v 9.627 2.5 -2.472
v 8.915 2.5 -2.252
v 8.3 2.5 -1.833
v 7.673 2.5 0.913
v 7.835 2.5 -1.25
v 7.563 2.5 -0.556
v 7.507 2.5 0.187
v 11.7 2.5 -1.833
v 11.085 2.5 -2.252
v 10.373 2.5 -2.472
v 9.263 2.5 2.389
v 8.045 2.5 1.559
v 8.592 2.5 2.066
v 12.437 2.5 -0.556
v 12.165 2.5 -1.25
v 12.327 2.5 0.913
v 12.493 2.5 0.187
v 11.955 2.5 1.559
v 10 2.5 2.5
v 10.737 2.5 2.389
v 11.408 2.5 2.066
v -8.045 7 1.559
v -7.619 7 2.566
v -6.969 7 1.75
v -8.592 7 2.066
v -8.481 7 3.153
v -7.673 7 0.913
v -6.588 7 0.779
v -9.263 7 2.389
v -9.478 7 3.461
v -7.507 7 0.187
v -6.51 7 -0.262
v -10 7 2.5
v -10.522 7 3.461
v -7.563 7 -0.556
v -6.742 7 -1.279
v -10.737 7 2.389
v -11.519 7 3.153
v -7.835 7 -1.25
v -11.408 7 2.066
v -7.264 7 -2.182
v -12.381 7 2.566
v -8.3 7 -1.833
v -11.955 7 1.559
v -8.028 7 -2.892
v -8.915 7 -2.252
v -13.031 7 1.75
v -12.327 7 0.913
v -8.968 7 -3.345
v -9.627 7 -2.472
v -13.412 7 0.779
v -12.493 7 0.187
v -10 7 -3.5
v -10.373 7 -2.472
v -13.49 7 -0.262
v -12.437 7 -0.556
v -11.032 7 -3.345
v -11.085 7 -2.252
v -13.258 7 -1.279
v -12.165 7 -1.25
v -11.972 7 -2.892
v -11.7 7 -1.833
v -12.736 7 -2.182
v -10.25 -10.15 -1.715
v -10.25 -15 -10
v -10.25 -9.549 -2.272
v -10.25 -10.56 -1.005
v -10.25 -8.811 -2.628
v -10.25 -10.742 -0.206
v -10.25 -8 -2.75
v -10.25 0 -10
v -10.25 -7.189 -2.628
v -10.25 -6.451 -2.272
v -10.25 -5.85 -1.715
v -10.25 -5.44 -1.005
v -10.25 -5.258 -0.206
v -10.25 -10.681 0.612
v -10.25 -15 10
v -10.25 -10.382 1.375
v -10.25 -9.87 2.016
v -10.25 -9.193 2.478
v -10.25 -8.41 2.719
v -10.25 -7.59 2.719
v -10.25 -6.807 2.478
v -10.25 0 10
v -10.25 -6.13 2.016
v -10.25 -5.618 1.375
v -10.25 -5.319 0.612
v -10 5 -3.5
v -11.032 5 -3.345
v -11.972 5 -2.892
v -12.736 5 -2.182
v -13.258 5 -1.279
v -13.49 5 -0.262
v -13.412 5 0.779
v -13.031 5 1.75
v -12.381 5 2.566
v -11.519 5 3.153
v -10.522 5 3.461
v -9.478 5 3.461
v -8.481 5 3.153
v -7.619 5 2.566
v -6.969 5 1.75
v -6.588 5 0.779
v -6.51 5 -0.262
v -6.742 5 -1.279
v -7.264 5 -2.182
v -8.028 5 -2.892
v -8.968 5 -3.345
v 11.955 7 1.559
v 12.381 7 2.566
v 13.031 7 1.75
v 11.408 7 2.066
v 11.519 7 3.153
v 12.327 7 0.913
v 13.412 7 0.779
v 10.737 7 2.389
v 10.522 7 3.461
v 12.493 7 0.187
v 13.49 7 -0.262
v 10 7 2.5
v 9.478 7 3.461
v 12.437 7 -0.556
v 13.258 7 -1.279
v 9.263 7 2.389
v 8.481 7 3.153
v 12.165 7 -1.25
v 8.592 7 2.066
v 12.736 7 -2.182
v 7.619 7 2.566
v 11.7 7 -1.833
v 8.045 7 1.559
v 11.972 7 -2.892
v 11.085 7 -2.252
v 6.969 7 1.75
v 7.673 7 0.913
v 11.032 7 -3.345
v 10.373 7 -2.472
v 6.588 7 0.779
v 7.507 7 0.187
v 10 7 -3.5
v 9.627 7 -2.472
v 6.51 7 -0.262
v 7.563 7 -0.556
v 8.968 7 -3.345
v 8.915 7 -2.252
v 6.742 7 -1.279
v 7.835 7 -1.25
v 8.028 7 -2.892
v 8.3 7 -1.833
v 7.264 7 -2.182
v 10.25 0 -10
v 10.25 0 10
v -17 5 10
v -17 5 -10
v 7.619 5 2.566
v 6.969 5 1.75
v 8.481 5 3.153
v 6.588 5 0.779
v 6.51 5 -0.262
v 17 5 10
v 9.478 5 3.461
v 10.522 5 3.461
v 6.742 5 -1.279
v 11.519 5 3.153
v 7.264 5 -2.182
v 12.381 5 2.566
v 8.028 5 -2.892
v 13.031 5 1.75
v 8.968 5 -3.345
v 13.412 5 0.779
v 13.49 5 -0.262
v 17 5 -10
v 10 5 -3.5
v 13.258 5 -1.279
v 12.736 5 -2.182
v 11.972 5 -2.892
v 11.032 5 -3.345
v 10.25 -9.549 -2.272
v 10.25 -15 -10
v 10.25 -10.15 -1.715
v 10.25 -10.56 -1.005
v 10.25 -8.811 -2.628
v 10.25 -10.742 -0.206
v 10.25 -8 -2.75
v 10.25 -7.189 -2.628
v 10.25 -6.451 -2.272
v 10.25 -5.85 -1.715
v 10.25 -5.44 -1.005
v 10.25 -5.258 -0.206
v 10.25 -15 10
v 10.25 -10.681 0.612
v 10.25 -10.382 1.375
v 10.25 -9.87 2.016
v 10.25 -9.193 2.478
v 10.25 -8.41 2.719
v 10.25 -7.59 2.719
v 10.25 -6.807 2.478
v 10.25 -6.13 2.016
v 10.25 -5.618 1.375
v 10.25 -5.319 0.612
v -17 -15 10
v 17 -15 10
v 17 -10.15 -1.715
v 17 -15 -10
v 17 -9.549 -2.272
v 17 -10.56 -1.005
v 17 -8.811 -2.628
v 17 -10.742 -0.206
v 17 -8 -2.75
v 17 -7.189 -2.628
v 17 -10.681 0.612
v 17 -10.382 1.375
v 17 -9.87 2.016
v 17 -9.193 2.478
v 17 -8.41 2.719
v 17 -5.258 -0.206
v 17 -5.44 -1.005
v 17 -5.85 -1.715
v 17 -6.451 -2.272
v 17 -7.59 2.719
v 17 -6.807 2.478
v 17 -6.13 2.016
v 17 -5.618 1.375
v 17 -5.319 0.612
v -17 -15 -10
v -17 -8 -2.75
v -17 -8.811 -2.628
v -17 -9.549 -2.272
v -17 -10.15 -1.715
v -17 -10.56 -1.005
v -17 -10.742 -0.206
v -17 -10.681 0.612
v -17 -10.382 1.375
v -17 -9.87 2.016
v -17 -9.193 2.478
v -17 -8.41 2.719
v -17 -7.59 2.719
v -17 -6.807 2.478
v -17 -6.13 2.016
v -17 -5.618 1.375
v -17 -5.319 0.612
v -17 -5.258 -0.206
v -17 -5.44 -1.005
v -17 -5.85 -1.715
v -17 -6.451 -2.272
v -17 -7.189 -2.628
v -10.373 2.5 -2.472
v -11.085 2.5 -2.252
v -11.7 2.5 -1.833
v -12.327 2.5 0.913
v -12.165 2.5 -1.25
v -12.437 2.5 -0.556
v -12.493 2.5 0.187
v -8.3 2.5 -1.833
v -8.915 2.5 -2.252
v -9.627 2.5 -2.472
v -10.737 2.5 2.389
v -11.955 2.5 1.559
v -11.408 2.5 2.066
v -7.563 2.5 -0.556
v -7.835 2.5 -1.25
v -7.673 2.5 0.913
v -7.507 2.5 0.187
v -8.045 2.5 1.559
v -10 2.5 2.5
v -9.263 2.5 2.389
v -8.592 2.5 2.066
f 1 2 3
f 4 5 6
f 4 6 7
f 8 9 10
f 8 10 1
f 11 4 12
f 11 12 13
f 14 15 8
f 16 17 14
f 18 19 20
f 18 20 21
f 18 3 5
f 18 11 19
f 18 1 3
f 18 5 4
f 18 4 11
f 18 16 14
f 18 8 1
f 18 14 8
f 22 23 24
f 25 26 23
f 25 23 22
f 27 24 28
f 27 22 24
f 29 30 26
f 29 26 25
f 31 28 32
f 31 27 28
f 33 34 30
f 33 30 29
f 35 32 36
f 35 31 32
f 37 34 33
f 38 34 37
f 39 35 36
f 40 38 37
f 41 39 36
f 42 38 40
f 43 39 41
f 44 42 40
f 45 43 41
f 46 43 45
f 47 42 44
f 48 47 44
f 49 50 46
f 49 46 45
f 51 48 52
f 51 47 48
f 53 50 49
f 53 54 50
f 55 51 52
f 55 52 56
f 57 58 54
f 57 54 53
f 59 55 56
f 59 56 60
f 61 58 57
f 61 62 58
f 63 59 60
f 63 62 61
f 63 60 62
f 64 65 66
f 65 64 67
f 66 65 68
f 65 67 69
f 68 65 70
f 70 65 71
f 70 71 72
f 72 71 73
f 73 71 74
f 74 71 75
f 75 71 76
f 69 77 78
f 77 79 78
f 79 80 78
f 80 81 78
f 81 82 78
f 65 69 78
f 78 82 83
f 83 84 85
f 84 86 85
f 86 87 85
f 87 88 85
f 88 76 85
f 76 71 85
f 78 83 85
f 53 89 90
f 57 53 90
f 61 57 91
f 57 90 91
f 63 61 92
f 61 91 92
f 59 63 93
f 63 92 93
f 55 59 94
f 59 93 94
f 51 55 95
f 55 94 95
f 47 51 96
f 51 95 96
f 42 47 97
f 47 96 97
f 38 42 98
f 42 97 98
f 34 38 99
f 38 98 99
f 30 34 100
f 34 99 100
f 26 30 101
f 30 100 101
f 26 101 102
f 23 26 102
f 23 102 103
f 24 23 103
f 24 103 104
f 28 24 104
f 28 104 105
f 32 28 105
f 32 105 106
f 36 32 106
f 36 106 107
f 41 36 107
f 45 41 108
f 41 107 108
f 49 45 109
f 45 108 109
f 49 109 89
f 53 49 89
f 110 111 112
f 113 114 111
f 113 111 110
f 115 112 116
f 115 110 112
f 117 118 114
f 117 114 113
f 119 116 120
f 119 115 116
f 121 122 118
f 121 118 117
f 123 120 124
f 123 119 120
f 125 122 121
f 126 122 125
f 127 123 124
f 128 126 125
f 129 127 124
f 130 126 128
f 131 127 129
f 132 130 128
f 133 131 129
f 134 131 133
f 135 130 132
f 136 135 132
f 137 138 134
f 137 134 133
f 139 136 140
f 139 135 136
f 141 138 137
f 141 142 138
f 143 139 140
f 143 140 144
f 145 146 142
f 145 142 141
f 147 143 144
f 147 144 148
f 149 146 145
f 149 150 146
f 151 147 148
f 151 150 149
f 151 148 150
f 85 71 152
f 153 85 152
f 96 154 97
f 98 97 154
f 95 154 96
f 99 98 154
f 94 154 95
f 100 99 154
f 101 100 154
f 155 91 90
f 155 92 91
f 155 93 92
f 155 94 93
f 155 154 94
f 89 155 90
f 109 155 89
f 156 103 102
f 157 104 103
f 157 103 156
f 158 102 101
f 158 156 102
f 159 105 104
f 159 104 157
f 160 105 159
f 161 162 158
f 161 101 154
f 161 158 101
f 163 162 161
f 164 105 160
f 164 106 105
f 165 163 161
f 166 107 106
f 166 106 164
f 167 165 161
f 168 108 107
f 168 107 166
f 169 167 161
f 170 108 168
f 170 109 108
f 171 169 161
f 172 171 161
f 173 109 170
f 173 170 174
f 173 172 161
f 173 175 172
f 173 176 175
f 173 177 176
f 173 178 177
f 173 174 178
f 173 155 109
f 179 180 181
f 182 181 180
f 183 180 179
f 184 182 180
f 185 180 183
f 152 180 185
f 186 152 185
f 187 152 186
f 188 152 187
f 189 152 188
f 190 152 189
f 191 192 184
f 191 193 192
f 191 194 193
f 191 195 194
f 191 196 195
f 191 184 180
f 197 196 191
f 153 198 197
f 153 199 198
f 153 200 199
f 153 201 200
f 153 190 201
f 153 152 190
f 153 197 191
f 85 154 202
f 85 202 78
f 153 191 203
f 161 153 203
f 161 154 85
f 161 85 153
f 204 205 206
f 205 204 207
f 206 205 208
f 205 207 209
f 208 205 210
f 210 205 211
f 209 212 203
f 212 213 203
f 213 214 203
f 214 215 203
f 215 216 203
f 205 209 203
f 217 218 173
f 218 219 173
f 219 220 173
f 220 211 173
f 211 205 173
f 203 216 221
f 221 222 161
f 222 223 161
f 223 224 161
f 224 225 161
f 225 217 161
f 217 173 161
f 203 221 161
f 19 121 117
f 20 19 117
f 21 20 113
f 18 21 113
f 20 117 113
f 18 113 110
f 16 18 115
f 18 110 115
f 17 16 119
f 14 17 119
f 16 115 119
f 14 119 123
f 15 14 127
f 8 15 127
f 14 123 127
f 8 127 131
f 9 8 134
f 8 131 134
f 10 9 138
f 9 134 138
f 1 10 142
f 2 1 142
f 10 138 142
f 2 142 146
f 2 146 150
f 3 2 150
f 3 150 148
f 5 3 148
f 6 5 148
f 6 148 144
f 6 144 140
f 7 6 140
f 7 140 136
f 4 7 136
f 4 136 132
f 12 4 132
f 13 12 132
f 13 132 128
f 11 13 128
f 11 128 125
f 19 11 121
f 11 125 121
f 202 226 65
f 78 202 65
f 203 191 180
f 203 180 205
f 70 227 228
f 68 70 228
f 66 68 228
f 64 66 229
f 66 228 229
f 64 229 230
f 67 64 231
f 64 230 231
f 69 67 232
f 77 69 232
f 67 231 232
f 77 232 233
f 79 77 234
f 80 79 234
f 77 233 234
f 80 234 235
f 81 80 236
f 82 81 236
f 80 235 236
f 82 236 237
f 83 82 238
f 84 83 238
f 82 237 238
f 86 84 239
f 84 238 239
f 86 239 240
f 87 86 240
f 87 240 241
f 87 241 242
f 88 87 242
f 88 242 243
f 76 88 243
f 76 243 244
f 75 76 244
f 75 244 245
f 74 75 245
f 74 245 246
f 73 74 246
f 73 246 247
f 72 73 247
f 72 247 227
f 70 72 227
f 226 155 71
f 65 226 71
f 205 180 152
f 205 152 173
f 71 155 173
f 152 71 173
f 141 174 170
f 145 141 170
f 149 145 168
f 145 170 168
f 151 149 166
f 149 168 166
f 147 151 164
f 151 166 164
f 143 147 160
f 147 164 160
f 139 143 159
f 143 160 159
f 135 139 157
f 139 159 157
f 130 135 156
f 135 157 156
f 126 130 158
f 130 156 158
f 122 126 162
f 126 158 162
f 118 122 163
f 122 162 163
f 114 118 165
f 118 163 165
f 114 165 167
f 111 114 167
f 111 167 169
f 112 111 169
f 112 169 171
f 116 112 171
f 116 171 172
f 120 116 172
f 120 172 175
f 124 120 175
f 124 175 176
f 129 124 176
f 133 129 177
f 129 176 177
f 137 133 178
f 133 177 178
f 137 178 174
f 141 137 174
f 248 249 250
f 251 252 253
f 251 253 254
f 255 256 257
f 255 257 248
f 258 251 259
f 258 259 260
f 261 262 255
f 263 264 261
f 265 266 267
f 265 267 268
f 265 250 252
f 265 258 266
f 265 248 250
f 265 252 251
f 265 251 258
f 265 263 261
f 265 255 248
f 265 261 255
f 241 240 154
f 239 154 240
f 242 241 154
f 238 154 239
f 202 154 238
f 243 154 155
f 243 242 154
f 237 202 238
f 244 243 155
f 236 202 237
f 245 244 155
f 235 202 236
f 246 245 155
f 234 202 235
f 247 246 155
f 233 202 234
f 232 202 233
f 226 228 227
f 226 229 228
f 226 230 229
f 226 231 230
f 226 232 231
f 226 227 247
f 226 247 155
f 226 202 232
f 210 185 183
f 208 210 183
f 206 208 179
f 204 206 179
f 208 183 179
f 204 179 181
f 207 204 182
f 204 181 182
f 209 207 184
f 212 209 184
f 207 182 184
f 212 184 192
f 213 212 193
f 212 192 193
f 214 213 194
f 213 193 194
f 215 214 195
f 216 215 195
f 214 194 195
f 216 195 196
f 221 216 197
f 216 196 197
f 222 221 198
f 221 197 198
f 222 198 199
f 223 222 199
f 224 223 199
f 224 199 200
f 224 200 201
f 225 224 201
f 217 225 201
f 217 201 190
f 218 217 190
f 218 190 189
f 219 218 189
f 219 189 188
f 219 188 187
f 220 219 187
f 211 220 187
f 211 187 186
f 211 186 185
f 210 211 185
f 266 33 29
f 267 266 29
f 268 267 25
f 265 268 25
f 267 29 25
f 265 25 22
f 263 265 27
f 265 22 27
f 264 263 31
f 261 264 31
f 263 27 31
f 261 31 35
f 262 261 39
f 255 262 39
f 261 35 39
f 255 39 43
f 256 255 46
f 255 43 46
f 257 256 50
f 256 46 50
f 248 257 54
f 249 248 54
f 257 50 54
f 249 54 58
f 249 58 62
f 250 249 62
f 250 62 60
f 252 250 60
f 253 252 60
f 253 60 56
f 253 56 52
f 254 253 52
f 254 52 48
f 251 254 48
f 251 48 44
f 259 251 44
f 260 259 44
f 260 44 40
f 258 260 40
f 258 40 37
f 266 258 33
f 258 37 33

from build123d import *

# Parameters (mm, degrees)
SKETCH1_W            = 34
SKETCH1_H            = 20
BOSS_EXTRUDE1_DEPTH  = 5
SKETCH2_R            = 3.5
BOSS_EXTRUDE2_DEPTH  = 2
SKETCH3_R            = 2.5
CUT_EXTRUDE1_DEPTH   = 4.5
SKETCH4_W            = 6.75
SKETCH4_H            = 20
BOSS_EXTRUDE3_DEPTH  = 15
M5_CLEARANCE_HOLE1_D = 5.5


with BuildPart() as part:
    # Sketch1 → Boss-Extrude1 (new body)
    with BuildSketch(Plane(origin=(0, 0, 0), x_dir=(1, 0, 0), z_dir=(0, 1, 0))):
        Rectangle(SKETCH1_W, SKETCH1_H)
    extrude(amount=BOSS_EXTRUDE1_DEPTH)

    # Sketch2 → Boss-Extrude2 (add)
    with BuildSketch(Plane(origin=(0, 5, 0), x_dir=(1, 0, 0), z_dir=(0, 1, 0))):
        with Locations(Location((-10, 0, 0), (0, 0, 90))):
            Circle(SKETCH2_R)
        with Locations(Location((10, 0, 0), (0, 0, 90))):
            Circle(SKETCH2_R)
    extrude(amount=BOSS_EXTRUDE2_DEPTH)

    # Sketch3 → Cut-Extrude1 (cut)
    with BuildSketch(Plane(origin=(0, 7, 0), x_dir=(1, 0, 0), z_dir=(0, 1, 0))):
        with Locations(Location((-10, 0, 0), (0, 0, 270))):
            Circle(SKETCH3_R)
        with Locations(Location((10, 0, 0), (0, 0, 270))):
            Circle(SKETCH3_R)
    extrude(amount=-CUT_EXTRUDE1_DEPTH, mode=Mode.SUBTRACT)

    # Sketch4 → Boss-Extrude3 (add)
    with BuildSketch(Plane.XZ):
        with Locations((13.625, 0)):
            Rectangle(SKETCH4_W, SKETCH4_H)
        with Locations((-13.625, 0)):
            Rectangle(SKETCH4_W, SKETCH4_H)
    extrude(amount=BOSS_EXTRUDE3_DEPTH)

    # M5 Clearance Hole1 (through all)
    with Locations(Plane(origin=(17, -8, 0), x_dir=(0, 0, 1), z_dir=(1, 0, 0))):
        with Locations((0, 0)):
            Hole(M5_CLEARANCE_HOLE1_D / 2)


solid = part.part
